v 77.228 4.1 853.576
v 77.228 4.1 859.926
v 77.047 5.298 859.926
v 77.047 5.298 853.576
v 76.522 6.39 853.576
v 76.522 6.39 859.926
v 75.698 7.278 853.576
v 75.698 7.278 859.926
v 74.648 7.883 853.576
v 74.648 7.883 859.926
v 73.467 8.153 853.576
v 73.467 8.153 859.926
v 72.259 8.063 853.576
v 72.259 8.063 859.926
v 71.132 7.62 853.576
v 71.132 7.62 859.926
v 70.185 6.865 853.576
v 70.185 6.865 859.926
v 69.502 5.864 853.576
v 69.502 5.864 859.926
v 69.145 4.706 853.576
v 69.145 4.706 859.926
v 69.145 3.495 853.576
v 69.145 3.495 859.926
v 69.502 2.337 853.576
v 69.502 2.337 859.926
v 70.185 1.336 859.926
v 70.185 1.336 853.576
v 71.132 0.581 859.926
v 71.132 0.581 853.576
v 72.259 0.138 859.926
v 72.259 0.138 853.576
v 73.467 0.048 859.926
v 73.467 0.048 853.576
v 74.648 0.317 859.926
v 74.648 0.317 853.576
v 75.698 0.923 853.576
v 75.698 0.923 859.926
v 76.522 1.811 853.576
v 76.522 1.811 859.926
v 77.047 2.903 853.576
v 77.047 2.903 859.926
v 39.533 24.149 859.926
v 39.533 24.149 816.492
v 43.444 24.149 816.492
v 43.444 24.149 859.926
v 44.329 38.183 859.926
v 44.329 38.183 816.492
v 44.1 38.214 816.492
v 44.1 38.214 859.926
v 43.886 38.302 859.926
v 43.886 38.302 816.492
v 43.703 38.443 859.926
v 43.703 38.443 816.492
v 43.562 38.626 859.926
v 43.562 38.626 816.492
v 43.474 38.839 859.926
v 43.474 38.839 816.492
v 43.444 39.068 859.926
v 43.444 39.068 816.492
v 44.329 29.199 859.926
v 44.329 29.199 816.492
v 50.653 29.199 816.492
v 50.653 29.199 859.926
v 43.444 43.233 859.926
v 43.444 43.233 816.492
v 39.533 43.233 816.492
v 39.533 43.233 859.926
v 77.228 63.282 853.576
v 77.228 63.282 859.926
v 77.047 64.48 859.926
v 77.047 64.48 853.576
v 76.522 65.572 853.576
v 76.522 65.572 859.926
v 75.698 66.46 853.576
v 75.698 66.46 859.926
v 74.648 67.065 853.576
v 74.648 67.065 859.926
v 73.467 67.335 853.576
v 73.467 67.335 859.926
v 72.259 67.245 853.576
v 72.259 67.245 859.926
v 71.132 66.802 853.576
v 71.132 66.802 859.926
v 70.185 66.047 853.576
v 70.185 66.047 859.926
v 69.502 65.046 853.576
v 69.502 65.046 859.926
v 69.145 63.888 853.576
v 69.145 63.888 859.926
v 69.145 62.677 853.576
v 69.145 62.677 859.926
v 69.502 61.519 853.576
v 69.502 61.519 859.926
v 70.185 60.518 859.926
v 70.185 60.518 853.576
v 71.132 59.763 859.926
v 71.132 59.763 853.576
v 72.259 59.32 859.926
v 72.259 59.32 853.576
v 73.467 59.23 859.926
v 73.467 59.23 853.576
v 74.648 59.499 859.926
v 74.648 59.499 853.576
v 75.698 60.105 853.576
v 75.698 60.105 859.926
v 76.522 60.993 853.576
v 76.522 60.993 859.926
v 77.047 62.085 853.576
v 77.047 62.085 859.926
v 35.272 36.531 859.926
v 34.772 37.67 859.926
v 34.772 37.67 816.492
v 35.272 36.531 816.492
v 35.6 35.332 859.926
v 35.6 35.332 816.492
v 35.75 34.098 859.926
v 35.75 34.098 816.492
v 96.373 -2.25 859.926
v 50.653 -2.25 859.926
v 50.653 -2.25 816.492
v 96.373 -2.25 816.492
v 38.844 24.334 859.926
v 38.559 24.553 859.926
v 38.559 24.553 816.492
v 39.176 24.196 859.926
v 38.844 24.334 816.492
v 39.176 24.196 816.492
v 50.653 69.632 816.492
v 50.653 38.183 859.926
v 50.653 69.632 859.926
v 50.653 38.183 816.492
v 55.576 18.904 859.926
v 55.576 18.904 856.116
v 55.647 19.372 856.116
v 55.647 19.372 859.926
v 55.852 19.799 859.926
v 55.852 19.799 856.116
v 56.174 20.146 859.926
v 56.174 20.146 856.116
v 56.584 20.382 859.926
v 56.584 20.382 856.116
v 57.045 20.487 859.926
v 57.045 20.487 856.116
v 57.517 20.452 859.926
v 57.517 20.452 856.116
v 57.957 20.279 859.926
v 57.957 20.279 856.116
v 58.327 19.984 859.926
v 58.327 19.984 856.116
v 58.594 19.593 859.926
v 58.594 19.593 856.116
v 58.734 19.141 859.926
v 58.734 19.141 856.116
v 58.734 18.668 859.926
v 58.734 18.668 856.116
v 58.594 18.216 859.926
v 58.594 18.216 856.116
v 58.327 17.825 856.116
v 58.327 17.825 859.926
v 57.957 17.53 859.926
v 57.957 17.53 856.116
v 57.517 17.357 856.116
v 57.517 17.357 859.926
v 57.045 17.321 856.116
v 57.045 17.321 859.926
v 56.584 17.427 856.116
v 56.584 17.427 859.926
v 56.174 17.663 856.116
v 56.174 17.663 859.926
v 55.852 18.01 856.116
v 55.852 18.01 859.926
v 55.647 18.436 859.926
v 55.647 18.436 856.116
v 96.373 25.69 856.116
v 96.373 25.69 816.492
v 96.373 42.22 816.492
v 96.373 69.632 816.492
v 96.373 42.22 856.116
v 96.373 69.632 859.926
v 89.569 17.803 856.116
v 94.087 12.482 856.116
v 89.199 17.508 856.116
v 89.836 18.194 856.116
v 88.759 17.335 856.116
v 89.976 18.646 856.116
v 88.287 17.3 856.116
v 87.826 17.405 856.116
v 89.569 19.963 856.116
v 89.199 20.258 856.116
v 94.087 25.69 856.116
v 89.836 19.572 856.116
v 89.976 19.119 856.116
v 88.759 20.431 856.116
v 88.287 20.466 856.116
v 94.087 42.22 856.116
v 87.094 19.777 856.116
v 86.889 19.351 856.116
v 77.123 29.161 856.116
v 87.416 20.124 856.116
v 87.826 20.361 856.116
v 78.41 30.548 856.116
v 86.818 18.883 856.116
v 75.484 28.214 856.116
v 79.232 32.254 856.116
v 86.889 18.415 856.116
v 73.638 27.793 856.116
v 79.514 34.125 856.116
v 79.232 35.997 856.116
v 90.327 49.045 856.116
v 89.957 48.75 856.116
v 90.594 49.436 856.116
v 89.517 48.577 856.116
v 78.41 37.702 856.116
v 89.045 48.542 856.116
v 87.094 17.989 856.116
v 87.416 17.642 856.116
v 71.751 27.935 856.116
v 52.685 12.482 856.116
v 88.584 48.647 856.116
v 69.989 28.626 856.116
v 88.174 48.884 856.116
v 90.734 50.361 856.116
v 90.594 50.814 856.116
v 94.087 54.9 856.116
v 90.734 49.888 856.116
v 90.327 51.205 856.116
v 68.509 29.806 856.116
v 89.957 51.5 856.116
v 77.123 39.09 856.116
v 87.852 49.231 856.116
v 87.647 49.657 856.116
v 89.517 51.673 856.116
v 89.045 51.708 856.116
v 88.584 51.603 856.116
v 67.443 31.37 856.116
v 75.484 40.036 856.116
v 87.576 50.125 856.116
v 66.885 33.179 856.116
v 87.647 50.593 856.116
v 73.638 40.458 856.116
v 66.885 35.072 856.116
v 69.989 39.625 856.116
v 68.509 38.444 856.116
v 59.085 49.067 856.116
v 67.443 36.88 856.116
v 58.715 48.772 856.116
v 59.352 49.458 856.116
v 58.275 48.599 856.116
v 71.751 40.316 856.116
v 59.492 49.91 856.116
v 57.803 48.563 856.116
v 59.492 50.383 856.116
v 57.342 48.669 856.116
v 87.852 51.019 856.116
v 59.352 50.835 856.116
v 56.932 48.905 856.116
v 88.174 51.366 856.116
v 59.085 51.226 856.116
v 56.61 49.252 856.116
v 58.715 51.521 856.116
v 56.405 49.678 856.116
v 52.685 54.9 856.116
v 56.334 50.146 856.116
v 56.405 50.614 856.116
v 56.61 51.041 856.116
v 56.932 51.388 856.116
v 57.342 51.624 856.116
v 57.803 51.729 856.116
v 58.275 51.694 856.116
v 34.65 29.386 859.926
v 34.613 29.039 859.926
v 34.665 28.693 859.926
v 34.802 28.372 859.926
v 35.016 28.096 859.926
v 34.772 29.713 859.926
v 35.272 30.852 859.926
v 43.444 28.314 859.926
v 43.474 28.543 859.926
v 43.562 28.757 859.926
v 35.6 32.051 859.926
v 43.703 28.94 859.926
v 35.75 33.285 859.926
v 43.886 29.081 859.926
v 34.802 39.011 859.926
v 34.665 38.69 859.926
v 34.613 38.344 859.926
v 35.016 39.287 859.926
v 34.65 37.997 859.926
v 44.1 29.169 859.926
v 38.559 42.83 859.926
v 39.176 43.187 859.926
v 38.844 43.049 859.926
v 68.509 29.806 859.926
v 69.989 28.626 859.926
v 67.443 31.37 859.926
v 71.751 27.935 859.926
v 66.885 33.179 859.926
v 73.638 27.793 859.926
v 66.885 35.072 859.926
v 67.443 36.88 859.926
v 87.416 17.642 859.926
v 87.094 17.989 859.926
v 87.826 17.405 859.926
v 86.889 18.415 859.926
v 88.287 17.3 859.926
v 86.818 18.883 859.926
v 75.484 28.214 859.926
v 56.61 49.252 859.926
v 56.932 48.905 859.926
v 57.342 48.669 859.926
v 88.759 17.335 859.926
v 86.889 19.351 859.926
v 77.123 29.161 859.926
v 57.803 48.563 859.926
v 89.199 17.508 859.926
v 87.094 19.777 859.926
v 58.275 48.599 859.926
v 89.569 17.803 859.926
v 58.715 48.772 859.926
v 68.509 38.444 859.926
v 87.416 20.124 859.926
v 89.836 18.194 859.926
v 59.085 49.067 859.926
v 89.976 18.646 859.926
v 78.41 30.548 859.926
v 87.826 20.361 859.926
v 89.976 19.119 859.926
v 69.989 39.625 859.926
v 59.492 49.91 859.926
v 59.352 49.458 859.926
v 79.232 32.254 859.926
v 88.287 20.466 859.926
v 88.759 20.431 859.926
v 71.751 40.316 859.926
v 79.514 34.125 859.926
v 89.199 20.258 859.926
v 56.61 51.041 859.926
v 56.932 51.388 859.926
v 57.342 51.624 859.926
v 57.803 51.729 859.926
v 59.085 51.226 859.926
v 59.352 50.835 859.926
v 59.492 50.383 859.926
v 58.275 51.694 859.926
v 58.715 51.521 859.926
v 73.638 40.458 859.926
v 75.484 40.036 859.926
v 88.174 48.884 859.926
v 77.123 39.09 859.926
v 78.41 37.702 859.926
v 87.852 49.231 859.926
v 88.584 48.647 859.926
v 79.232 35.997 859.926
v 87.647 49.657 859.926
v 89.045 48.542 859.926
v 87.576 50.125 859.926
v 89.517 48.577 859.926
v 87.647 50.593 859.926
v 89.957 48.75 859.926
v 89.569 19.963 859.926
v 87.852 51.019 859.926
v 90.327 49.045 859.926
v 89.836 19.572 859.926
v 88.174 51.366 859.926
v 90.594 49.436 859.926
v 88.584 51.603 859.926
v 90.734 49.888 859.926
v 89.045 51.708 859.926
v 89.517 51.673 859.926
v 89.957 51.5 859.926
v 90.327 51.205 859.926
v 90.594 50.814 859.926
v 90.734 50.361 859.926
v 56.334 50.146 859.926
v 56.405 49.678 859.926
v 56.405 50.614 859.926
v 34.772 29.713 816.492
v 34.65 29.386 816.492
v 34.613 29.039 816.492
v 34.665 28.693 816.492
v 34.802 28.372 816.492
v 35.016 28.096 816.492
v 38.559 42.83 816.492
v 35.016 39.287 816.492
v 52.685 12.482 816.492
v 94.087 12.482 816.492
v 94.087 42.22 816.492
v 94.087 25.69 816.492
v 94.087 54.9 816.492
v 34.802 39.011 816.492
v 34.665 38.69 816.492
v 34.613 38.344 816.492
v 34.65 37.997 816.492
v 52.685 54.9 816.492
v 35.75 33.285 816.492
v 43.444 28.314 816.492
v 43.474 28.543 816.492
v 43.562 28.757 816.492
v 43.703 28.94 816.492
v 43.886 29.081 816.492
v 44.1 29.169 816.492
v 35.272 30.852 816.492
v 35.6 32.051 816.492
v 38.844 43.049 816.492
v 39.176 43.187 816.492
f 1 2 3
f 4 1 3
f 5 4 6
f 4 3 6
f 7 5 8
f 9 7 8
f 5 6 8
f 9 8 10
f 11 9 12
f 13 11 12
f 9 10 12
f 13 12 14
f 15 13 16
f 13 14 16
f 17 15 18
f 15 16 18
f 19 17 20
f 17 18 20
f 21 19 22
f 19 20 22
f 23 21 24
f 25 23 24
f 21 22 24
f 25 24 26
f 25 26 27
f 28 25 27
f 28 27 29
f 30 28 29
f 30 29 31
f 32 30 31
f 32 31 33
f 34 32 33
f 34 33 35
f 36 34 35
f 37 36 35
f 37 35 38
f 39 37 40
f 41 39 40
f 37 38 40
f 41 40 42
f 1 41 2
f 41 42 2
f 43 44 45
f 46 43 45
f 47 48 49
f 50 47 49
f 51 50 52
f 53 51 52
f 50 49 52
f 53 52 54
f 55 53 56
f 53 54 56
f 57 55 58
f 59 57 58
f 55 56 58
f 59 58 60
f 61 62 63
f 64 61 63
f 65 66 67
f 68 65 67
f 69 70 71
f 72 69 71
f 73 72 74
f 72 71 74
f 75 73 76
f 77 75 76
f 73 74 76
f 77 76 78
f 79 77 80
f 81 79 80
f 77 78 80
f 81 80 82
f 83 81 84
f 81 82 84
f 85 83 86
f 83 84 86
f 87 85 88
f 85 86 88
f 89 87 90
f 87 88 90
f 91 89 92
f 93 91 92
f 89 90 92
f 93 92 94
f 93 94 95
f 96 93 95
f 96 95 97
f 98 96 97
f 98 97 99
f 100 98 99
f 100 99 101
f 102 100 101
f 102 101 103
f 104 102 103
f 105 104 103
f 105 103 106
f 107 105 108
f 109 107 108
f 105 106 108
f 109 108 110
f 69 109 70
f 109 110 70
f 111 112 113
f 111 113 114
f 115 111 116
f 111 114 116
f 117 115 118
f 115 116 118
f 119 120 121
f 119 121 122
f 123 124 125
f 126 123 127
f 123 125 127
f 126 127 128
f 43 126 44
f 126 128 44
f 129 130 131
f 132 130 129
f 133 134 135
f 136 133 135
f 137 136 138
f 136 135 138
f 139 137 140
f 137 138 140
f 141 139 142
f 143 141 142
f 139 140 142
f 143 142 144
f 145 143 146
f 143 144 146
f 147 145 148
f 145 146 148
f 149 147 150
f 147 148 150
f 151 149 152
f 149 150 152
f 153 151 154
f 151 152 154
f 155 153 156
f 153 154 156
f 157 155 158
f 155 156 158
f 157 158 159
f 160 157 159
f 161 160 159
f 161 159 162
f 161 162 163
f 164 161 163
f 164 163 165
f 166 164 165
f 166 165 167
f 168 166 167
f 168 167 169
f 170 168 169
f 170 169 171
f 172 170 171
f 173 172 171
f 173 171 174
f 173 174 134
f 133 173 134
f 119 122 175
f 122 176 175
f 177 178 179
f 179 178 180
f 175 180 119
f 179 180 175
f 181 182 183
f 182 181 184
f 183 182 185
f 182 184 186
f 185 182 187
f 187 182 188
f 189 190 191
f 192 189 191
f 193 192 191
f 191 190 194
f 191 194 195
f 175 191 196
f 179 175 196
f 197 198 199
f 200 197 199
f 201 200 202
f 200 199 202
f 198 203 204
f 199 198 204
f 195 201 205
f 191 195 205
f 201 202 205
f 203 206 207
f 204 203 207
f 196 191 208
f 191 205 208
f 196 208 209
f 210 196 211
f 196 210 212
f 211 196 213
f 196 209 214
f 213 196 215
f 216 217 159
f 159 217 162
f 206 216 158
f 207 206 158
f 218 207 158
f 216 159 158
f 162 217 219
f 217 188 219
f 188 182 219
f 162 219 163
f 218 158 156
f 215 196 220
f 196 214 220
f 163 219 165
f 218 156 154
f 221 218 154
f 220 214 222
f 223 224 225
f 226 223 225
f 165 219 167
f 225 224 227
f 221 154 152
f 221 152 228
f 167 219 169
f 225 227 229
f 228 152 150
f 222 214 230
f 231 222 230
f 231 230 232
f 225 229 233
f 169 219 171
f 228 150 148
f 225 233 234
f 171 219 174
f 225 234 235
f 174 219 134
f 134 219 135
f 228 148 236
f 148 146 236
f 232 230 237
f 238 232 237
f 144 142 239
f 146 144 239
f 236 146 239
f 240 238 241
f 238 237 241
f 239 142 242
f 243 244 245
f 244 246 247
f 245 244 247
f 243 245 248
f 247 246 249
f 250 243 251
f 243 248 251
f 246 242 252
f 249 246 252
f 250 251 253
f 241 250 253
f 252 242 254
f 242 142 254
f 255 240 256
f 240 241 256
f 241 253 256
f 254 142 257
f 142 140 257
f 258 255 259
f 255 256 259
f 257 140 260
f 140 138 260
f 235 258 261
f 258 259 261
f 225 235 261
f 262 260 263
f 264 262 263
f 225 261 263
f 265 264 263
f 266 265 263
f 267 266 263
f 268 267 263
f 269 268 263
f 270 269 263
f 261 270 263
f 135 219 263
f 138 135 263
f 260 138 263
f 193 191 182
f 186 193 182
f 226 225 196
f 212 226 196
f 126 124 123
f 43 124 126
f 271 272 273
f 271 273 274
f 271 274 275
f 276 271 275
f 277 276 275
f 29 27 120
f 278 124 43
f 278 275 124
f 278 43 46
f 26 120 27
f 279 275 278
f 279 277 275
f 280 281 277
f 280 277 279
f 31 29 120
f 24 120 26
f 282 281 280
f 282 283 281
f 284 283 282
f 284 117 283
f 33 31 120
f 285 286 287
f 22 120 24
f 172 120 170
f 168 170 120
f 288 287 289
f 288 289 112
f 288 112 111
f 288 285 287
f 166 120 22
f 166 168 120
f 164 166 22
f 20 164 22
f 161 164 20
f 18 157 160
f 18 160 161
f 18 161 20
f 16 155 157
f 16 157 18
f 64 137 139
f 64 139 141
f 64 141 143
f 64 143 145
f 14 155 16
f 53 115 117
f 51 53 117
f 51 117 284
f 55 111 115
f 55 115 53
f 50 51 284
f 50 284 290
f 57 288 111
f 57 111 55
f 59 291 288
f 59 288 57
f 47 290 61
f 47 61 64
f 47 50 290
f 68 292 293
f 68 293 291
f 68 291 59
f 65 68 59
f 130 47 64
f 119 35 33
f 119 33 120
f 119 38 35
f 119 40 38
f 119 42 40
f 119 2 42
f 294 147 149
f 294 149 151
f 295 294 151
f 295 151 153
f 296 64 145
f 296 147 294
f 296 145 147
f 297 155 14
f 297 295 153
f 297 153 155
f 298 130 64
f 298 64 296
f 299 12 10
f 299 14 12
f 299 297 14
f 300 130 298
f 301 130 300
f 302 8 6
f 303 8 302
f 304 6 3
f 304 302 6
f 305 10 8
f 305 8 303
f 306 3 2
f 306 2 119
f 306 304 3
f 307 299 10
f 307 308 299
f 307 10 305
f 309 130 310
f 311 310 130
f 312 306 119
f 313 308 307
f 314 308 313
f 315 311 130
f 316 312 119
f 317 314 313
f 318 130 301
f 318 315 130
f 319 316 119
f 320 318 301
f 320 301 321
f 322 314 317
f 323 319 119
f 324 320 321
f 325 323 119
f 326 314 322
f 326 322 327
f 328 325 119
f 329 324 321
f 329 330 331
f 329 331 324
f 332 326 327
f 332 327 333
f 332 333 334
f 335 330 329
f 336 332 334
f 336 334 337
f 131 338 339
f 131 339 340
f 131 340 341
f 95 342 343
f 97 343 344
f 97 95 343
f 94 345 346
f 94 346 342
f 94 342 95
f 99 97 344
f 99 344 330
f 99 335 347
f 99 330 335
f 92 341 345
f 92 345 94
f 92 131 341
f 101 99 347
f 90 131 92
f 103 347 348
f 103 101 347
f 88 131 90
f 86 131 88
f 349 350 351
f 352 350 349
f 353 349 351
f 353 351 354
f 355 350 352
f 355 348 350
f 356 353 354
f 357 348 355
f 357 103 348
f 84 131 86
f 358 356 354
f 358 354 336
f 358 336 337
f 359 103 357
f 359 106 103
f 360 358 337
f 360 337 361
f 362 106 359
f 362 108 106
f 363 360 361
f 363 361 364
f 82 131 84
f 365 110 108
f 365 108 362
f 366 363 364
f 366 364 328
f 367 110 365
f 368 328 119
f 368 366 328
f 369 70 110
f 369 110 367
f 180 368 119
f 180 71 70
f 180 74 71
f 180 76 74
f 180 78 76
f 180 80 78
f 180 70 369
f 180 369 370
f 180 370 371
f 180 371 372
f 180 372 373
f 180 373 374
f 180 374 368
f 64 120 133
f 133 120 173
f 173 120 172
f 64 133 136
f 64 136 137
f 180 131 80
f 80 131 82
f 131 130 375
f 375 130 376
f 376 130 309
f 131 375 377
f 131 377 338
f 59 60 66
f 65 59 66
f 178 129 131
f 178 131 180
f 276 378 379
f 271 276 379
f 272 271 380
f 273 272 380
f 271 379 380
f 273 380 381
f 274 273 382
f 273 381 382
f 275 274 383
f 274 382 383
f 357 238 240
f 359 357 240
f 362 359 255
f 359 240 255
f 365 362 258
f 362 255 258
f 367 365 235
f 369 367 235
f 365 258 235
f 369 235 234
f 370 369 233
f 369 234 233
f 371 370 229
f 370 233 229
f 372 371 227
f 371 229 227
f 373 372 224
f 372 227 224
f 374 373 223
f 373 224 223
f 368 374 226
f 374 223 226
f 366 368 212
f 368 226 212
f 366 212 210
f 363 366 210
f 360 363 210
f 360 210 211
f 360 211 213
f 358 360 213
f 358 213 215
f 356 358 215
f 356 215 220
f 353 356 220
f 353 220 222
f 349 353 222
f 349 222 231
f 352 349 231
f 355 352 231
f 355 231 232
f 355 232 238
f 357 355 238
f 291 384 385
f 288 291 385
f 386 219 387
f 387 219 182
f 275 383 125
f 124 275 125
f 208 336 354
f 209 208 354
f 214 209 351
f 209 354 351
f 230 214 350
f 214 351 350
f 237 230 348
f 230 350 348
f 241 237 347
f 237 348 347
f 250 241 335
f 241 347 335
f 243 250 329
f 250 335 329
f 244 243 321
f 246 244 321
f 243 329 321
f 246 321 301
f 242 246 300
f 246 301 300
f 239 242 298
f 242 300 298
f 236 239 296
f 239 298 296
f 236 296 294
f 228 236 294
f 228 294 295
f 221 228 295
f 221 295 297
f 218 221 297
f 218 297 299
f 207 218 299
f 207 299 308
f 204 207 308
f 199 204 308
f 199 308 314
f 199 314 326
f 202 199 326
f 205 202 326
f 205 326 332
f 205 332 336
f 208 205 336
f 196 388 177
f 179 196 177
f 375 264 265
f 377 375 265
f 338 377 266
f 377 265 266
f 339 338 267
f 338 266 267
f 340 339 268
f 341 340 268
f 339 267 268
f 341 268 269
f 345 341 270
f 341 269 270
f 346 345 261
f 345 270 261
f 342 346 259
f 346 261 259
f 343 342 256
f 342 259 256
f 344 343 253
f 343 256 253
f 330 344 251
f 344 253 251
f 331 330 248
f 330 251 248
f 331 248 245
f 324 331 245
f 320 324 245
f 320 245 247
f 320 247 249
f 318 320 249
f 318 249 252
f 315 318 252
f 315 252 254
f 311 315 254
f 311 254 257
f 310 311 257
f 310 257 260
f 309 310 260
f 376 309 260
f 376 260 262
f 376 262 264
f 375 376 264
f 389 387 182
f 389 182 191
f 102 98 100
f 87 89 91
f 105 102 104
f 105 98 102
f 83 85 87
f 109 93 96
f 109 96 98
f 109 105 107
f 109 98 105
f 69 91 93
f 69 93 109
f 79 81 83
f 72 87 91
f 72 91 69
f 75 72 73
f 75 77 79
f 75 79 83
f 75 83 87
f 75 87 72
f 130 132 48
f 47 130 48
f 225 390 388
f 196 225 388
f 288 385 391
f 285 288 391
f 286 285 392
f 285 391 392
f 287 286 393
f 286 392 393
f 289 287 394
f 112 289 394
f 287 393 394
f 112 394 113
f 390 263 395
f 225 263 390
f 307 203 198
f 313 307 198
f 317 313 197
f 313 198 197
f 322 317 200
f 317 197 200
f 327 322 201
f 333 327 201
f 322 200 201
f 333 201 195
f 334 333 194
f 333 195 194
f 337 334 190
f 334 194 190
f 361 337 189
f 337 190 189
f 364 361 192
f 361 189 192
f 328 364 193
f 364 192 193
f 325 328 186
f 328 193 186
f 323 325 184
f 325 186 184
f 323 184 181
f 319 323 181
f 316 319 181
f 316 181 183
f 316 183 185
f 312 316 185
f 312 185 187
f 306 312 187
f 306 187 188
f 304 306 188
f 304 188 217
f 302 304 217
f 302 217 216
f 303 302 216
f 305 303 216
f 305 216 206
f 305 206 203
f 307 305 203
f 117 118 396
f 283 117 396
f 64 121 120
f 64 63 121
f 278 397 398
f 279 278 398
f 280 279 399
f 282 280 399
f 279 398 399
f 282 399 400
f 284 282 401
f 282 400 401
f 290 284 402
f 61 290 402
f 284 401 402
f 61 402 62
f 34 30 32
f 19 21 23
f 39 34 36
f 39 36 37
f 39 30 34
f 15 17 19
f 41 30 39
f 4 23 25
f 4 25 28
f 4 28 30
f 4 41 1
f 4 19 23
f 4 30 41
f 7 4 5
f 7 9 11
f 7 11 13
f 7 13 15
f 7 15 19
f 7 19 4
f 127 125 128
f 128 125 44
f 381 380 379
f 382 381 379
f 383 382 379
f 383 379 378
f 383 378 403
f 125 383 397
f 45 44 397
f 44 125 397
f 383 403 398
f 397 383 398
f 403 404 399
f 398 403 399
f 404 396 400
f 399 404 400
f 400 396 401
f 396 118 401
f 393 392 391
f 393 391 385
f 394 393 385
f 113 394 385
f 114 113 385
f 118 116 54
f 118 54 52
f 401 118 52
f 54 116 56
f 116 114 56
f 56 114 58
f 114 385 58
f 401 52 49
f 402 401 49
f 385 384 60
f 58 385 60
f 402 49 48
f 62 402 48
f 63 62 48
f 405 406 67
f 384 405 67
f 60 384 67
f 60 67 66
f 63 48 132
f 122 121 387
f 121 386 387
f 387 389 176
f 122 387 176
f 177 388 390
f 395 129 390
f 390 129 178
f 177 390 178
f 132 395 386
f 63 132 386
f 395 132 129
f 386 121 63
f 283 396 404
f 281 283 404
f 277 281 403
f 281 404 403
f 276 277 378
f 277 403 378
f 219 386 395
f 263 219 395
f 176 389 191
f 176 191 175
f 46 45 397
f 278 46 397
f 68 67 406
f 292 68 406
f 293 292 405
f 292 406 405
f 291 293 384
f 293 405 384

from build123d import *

# Parameters (mm, degrees)
BOSS_EXTRUDE1_DEPTH = 43.434
SKETCH3_W           = 3.81
SKETCH3_H           = 46.482
BOSS_EXTRUDE2_DEPTH = 43.688
BOSS_EXTRUDE5_DEPTH = 39.624
SKETCH9_R           = 6.35
CUT_EXTRUDE1_DEPTH  = 44.434
SKETCH10_R          = 1.5875
CUT_EXTRUDE2_DEPTH  = 4.81
SKETCH12_W          = 45.72
SKETCH12_H          = 43.434
BOSS_EXTRUDE6_DEPTH = 12.7
SKETCH13_W          = 45.72
SKETCH13_H          = 43.434
BOSS_EXTRUDE7_DEPTH = 12.7
SKETCH14_R          = 4.064
CUT_EXTRUDE3_DEPTH  = 6.35


with BuildPart() as part:
    # Sketch2 → Boss-Extrude1 (new body)
    with BuildSketch(Plane.XY.offset(816.492372385)):
        with BuildLine():
            Line((35.750095932, 34.097582937), (35.750095932, 33.285263123))
            ThreePointArc((35.750095932, 33.285263123), (35.457981836, 31.445408446), (34.772439624, 29.71323416))
            ThreePointArc((34.772439624, 29.71323416), (34.62798184, 28.864383796), (35.01595222, 28.095687512))
            Line((35.01595222, 28.095687512), (38.55890274, 24.552736992))
            ThreePointArc((38.55890274, 24.552736992), (39.005633691, 24.254240914), (39.532588778, 24.14942303))
            Line((39.532588778, 24.14942303), (43.443796213, 24.14942303))
            Line((43.443796213, 24.14942303), (43.443796213, 28.31442303))
            ThreePointArc((43.443796213, 28.31442303), (43.703006711, 28.940212531), (44.328796213, 29.19942303))
            Line((44.328796213, 29.19942303), (48.113296213, 29.19942303))
            Line((48.113296213, 29.19942303), (50.653296213, 29.19942303))
            Line((50.653296213, 29.19942303), (50.653296213, 10.45042303))
            Line((50.653296213, 10.45042303), (52.685296213, 10.45042303))
            Line((52.685296213, 10.45042303), (52.685296213, 56.93242303))
            Line((52.685296213, 56.93242303), (50.653296213, 56.93242303))
            Line((50.653296213, 56.93242303), (50.653296213, 38.18342303))
            Line((50.653296213, 38.18342303), (48.113296213, 38.18342303))
            Line((48.113296213, 38.18342303), (44.328796213, 38.18342303))
            ThreePointArc((44.328796213, 38.18342303), (43.703006711, 38.442633529), (43.443796213, 39.06842303))
            Line((43.443796213, 39.06842303), (43.443796213, 43.23342303))
            Line((43.443796213, 43.23342303), (39.532588778, 43.23342303))
            ThreePointArc((39.532588778, 43.23342303), (39.005633691, 43.128605146), (38.55890274, 42.830109068))
            Line((38.55890274, 42.830109068), (35.01595222, 39.287158548))
            ThreePointArc((35.01595222, 39.287158548), (34.62798184, 38.518462264), (34.772439624, 37.6696119))
            ThreePointArc((34.772439624, 37.6696119), (35.457981836, 35.937437615), (35.750095932, 34.097582937))
        make_face()
    extrude(amount=BOSS_EXTRUDE1_DEPTH)

    # Sketch3 → Boss-Extrude2 (add)
    with BuildSketch(Plane(origin=(52.685296213, 0, 0), x_dir=(0, 0, -1), z_dir=(1, 0, 0))):
        with Locations((-858.021372385, 33.69142303)):
            Rectangle(SKETCH3_W, SKETCH3_H)
    extrude(amount=BOSS_EXTRUDE2_DEPTH)

    # Sketch8 → Boss-Extrude5 (add)
    with BuildSketch(Plane(origin=(0, 0, 856.116372385), x_dir=(-1, 0, 0), z_dir=(0, 0, -1))):
        Polygon((-96.373296213, 56.93242303), (-52.685296213, 56.93242303), (-52.685296213, 54.90042303), (-94.087296213, 54.90042303), (-94.087296213, 42.220354744), (-96.373296213, 42.220354744), (-96.373296213, 54.90042303), align=None)
        Polygon((-96.373296213, 10.45042303), (-52.685296213, 10.45042303), (-52.685296213, 12.48242303), (-94.087296213, 12.48242303), (-94.087296213, 25.69042303), (-96.373296213, 25.69042303), (-96.373296213, 12.48242303), align=None)
    extrude(amount=BOSS_EXTRUDE5_DEPTH)

    # Sketch9 → Cut-Extrude1 (cut, through all)
    with BuildSketch(Plane.XY.offset(859.926372385)):
        with Locations((73.163747061, 34.125316724)):
            Circle(SKETCH9_R)
    extrude(amount=-CUT_EXTRUDE1_DEPTH, mode=Mode.SUBTRACT)

    # Sketch10 → Cut-Extrude2 (cut, through all)
    with BuildSketch(Plane(origin=(0, 0, 856.116372385), x_dir=(-1, 0, 0), z_dir=(0, 0, -1))):
        with Locations((-89.163747266, 50.124873673)):
            Circle(SKETCH10_R)
        with Locations((-57.921747266, 50.14642303)):
            Circle(SKETCH10_R)
        with Locations((-57.163746856, 18.90442303)):
            Circle(SKETCH10_R)
        with Locations((-88.405746856, 18.882873673)):
            Circle(SKETCH10_R)
    extrude(amount=-CUT_EXTRUDE2_DEPTH, mode=Mode.SUBTRACT)

    # Sketch12 → Boss-Extrude6 (add)
    with BuildSketch(Plane(origin=(0, 56.93242303, 0), x_dir=(1, 0, 0), z_dir=(0, 1, 0))):
        with Locations((73.513296213, -838.209372385)):
            Rectangle(SKETCH12_W, SKETCH12_H)
    extrude(amount=BOSS_EXTRUDE6_DEPTH)

    # Sketch13 → Boss-Extrude7 (add)
    with BuildSketch(Plane.XZ.offset(-10.45042303)):
        with Locations((73.513296213, 838.209372385)):
            Rectangle(SKETCH13_W, SKETCH13_H)
    extrude(amount=BOSS_EXTRUDE7_DEPTH)

    # Sketch14 → Cut-Extrude3 (cut)
    with BuildSketch(Plane.XY.offset(859.926372385)):
        with Locations((73.163747061, 63.28242303)):
            Circle(SKETCH14_R)
        with Locations((73.163747061, 4.10042303)):
            Circle(SKETCH14_R)
    extrude(amount=-CUT_EXTRUDE3_DEPTH, mode=Mode.SUBTRACT)


solid = part.part
